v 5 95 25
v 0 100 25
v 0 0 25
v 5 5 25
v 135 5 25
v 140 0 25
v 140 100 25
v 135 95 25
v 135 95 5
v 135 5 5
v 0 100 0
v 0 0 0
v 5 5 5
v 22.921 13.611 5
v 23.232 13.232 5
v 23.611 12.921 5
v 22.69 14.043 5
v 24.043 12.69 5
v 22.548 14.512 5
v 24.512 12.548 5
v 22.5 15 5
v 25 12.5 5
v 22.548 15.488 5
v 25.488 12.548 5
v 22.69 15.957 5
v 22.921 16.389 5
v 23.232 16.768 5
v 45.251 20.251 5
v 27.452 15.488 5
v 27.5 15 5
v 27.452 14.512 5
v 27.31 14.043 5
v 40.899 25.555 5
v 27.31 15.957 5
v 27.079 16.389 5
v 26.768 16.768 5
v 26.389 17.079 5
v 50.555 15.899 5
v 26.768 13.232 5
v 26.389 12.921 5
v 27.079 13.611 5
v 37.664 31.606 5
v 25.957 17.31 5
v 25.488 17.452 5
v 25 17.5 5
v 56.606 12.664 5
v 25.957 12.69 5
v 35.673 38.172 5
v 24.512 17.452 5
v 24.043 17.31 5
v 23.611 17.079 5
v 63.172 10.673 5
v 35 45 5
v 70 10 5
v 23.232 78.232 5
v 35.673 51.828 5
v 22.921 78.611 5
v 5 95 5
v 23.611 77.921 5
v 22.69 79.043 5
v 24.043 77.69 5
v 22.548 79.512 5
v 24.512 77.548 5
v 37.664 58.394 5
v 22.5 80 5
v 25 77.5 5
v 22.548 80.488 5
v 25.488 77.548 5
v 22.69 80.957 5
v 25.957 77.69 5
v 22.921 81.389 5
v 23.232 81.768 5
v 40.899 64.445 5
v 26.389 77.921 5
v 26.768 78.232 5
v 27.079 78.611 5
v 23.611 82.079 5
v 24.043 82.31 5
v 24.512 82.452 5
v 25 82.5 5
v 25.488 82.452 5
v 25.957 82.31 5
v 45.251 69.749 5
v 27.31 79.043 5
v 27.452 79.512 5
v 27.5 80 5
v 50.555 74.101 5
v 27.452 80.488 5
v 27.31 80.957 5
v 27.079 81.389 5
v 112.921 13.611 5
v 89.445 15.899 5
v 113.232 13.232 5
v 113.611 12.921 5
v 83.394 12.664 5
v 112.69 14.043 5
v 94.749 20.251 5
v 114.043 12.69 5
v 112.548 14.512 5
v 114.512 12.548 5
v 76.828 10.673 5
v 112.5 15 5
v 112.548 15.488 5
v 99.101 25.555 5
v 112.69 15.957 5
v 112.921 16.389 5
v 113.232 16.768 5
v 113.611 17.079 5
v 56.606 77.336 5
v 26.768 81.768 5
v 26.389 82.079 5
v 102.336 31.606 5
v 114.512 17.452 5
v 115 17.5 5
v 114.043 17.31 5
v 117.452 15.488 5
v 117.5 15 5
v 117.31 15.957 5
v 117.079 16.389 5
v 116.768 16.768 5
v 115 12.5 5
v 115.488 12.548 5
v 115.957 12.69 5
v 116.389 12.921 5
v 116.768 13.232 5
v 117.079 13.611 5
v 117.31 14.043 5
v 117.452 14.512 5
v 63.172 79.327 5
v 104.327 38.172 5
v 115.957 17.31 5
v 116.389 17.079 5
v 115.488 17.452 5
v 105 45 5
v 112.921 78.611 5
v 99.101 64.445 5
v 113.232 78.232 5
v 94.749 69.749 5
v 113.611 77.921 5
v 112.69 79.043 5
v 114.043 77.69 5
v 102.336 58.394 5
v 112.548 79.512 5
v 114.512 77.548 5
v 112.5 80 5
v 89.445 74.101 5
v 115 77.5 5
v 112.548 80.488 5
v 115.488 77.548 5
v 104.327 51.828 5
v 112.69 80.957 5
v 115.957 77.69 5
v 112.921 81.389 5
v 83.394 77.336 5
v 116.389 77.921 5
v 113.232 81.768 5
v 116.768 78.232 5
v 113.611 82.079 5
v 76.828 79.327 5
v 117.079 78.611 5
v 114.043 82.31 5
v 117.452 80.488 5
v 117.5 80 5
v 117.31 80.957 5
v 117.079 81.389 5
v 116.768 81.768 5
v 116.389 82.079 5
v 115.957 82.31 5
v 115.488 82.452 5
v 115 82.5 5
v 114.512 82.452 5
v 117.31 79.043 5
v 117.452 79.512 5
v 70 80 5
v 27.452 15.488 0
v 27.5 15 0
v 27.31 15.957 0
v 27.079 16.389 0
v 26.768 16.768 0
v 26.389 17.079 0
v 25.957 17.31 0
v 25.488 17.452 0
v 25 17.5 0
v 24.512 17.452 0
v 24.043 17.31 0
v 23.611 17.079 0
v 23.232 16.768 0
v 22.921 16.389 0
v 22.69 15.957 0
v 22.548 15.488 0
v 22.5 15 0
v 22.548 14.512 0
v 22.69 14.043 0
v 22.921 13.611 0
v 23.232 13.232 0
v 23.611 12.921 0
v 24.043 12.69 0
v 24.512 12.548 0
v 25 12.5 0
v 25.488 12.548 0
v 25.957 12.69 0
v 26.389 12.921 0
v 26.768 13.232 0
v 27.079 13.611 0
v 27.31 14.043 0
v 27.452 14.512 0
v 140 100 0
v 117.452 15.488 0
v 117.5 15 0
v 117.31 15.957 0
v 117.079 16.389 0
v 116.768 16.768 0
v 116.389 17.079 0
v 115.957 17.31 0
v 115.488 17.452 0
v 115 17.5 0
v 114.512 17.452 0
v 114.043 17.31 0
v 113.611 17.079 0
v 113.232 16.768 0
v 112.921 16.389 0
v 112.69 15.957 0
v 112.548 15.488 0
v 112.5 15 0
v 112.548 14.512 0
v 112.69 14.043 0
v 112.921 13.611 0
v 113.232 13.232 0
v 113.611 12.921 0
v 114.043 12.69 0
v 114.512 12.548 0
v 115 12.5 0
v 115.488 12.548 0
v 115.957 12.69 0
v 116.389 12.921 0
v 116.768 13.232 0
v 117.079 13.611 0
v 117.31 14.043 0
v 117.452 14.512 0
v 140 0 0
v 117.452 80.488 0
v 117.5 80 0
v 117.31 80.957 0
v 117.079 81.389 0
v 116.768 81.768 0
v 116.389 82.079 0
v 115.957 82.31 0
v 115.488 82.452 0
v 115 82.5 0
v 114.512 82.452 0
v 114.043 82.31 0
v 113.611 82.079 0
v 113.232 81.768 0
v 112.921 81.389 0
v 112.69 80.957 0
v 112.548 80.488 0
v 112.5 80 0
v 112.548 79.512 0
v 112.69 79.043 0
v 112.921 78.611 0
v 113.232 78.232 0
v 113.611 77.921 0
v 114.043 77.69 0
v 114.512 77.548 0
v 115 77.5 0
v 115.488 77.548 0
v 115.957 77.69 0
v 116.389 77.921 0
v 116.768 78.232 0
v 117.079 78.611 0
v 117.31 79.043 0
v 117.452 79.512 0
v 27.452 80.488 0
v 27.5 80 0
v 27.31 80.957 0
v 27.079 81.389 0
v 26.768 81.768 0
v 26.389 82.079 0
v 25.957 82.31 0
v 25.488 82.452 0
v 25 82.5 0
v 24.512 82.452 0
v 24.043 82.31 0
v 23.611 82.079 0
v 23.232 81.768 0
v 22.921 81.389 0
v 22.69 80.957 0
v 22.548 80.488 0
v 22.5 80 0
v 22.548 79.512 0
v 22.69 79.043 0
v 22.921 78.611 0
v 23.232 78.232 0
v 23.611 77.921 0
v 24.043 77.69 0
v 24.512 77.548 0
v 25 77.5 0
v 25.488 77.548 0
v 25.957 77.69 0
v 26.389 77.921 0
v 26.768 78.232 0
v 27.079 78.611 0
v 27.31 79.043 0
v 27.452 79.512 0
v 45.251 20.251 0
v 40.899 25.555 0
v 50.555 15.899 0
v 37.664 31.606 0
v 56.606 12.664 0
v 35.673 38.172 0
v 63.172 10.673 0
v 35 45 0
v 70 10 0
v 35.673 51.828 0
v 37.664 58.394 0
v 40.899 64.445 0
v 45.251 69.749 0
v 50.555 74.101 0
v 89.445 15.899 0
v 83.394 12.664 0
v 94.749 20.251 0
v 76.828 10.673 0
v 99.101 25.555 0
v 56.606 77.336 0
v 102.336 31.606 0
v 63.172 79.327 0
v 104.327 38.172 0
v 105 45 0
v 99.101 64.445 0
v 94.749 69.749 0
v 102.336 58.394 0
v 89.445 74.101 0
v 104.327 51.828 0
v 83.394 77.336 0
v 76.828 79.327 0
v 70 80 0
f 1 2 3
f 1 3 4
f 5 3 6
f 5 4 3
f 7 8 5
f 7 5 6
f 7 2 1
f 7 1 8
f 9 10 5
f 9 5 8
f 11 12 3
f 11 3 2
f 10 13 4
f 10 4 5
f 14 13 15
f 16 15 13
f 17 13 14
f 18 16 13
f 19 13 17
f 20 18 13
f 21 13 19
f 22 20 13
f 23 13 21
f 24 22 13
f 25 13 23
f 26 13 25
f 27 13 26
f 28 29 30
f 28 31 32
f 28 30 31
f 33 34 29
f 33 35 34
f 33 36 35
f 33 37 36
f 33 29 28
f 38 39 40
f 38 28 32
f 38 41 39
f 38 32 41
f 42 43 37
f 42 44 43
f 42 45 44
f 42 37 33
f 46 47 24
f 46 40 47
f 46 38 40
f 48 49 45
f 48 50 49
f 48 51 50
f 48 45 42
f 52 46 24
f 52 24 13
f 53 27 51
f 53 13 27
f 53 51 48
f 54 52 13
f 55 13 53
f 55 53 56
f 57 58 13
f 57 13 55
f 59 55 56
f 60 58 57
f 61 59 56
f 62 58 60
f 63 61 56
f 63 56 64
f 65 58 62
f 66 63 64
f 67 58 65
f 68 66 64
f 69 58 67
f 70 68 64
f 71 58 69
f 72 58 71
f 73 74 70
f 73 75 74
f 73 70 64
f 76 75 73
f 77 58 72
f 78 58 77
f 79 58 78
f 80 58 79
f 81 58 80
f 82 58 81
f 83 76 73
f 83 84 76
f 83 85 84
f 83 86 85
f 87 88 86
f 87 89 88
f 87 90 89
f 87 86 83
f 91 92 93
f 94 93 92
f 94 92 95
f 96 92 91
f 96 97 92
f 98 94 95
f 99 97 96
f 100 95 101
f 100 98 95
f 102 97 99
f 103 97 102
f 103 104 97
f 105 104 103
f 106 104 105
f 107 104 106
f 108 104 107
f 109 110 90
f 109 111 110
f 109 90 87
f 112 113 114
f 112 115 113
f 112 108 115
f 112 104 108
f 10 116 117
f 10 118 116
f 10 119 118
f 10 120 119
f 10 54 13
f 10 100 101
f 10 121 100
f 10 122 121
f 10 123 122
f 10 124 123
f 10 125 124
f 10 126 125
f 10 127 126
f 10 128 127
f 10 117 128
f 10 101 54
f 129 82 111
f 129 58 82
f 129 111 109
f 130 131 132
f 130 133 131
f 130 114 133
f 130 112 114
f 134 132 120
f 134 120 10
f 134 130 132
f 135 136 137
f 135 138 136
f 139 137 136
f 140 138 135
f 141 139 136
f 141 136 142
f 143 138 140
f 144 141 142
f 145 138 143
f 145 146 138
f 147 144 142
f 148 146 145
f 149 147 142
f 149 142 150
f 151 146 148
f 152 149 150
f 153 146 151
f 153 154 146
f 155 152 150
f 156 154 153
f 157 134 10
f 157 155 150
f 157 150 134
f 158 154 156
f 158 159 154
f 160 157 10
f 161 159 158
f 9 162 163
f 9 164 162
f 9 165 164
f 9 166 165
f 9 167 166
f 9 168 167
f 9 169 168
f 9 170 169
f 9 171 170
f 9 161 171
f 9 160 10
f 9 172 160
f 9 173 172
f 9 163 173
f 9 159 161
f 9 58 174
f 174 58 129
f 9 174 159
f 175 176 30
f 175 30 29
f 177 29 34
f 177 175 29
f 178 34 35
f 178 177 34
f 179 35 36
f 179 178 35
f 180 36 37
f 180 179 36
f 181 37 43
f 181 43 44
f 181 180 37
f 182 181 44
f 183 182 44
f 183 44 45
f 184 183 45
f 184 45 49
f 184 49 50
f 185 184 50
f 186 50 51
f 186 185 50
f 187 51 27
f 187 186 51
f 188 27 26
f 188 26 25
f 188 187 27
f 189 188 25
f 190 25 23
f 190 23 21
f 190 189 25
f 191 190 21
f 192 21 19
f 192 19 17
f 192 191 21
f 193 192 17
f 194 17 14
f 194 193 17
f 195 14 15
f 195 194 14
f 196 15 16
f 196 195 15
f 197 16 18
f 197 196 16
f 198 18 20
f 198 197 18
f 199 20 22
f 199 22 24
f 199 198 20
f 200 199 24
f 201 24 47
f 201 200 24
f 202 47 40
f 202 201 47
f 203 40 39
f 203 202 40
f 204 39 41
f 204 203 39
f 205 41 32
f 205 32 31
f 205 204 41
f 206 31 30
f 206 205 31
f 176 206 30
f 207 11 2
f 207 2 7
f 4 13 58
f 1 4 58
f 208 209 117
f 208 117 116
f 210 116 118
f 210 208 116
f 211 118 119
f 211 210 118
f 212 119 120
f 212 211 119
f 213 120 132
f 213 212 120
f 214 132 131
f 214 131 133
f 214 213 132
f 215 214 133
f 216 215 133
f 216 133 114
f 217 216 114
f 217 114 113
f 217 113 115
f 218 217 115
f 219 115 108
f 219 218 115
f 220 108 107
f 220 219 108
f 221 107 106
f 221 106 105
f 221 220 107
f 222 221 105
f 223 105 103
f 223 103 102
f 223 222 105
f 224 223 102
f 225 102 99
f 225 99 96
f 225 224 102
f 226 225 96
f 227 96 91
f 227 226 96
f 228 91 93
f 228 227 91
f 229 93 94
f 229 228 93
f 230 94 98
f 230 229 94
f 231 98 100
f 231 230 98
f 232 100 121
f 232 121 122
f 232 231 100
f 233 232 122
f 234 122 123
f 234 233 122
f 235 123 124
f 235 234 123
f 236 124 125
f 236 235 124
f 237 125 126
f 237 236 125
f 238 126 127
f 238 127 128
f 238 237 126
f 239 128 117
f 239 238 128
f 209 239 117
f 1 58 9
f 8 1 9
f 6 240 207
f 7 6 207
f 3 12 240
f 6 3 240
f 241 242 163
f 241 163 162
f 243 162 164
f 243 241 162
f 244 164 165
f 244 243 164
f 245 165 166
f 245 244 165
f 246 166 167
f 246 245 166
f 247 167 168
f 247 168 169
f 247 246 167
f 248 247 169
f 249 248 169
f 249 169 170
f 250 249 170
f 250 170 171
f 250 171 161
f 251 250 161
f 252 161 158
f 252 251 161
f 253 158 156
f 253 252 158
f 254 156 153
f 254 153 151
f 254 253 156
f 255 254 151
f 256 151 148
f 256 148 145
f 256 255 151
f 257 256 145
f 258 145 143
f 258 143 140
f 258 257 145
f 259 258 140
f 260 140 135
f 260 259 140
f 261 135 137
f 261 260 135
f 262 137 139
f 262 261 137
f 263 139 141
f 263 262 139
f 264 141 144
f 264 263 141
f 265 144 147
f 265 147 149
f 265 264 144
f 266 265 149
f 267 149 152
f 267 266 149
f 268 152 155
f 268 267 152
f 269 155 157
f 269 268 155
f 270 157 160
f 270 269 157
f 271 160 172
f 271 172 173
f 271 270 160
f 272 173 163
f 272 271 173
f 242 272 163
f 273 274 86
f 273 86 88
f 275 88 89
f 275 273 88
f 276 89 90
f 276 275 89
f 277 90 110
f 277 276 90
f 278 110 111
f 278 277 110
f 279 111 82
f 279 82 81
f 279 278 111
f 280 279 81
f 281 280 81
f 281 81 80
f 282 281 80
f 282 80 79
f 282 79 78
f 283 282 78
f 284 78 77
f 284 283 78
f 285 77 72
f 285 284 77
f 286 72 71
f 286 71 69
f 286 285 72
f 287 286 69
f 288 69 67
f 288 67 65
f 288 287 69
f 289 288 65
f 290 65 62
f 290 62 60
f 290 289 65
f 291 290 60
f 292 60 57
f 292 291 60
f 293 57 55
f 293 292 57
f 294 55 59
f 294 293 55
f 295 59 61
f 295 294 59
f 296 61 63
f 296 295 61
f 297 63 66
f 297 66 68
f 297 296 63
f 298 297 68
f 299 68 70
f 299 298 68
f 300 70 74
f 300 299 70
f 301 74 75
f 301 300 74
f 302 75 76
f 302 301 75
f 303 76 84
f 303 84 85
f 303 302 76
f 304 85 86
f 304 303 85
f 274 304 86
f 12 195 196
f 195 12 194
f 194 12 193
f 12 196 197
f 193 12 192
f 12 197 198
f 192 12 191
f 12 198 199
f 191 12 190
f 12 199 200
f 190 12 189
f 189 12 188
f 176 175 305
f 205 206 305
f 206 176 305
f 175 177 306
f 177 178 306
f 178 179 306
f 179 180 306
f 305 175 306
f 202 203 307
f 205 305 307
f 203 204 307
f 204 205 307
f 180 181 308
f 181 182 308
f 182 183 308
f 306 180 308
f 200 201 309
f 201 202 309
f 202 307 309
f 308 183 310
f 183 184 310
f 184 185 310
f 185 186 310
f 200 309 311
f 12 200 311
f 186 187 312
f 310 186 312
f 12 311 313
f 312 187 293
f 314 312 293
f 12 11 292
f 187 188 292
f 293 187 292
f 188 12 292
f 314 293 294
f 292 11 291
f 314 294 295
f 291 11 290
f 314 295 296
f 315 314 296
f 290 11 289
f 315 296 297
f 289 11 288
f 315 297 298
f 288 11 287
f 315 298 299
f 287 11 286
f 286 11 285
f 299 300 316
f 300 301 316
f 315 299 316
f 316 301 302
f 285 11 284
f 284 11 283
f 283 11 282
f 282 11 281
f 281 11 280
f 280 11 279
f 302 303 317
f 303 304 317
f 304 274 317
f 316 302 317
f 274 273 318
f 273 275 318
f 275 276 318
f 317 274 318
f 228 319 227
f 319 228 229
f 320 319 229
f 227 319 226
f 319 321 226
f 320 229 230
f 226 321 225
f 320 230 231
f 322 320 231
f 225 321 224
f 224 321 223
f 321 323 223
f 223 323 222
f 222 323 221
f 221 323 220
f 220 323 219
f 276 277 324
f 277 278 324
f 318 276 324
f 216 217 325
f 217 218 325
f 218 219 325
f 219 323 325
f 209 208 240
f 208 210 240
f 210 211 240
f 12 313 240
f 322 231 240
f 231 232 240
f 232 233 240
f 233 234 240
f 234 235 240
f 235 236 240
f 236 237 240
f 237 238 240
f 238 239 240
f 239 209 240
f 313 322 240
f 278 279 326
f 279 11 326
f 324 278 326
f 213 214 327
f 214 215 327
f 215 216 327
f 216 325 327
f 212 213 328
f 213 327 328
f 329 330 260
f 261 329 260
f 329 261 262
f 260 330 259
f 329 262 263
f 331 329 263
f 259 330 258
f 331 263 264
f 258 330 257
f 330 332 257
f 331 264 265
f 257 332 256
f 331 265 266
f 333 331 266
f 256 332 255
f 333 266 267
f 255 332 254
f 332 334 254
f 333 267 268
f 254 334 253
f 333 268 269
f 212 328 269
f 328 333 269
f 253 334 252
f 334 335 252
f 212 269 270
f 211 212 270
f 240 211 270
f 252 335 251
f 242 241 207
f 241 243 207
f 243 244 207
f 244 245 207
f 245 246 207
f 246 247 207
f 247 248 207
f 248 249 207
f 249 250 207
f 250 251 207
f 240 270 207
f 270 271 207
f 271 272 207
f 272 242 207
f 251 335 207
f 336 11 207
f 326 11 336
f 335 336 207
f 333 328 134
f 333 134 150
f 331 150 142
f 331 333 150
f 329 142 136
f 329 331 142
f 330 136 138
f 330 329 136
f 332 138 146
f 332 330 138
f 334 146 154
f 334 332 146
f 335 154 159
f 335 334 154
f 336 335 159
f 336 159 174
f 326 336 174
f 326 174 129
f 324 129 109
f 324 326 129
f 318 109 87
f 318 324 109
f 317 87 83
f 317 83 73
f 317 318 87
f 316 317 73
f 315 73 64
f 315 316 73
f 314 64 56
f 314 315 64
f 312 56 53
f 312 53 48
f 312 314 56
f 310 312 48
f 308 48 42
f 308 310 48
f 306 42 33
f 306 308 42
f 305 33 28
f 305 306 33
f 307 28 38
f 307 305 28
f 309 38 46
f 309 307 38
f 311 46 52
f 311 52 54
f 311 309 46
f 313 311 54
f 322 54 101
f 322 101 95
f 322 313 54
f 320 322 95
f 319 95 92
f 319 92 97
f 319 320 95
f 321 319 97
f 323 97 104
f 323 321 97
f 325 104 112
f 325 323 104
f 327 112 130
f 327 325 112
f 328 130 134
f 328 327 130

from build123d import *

# Parameters (mm, degrees)
F0_W     = 140
F0_H     = 100
F0_W_2   = 130
F0_H_2   = 90
F1_DEPTH = 25
F0_R     = 2.5
F0_R_2   = 35
F2_DEPTH = 5


with BuildPart() as f1:
    # F0 (on Top) → F1 (new body)
    with BuildSketch(Plane.XY):
        with Locations((70, 50)):
            Rectangle(F0_W, F0_H)
        with Locations((70, 50)):
            Rectangle(F0_W_2, F0_H_2, mode=Mode.SUBTRACT)
    extrude(amount=F1_DEPTH)

    # F0 (on Top) → F2 (join)
    with BuildSketch(Plane.XY):
        with Locations((70, 50)):
            Rectangle(F0_W_2, F0_H_2)
        with Locations((25, 15)):
            Circle(F0_R, mode=Mode.SUBTRACT)
        with Locations((115, 15)):
            Circle(F0_R, mode=Mode.SUBTRACT)
        with Locations((70, 45)):
            Circle(F0_R_2, mode=Mode.SUBTRACT)
        with Locations((25, 80)):
            Circle(F0_R, mode=Mode.SUBTRACT)
        with Locations((115, 80)):
            Circle(F0_R, mode=Mode.SUBTRACT)
    extrude(amount=F2_DEPTH)


solid = f1.part
